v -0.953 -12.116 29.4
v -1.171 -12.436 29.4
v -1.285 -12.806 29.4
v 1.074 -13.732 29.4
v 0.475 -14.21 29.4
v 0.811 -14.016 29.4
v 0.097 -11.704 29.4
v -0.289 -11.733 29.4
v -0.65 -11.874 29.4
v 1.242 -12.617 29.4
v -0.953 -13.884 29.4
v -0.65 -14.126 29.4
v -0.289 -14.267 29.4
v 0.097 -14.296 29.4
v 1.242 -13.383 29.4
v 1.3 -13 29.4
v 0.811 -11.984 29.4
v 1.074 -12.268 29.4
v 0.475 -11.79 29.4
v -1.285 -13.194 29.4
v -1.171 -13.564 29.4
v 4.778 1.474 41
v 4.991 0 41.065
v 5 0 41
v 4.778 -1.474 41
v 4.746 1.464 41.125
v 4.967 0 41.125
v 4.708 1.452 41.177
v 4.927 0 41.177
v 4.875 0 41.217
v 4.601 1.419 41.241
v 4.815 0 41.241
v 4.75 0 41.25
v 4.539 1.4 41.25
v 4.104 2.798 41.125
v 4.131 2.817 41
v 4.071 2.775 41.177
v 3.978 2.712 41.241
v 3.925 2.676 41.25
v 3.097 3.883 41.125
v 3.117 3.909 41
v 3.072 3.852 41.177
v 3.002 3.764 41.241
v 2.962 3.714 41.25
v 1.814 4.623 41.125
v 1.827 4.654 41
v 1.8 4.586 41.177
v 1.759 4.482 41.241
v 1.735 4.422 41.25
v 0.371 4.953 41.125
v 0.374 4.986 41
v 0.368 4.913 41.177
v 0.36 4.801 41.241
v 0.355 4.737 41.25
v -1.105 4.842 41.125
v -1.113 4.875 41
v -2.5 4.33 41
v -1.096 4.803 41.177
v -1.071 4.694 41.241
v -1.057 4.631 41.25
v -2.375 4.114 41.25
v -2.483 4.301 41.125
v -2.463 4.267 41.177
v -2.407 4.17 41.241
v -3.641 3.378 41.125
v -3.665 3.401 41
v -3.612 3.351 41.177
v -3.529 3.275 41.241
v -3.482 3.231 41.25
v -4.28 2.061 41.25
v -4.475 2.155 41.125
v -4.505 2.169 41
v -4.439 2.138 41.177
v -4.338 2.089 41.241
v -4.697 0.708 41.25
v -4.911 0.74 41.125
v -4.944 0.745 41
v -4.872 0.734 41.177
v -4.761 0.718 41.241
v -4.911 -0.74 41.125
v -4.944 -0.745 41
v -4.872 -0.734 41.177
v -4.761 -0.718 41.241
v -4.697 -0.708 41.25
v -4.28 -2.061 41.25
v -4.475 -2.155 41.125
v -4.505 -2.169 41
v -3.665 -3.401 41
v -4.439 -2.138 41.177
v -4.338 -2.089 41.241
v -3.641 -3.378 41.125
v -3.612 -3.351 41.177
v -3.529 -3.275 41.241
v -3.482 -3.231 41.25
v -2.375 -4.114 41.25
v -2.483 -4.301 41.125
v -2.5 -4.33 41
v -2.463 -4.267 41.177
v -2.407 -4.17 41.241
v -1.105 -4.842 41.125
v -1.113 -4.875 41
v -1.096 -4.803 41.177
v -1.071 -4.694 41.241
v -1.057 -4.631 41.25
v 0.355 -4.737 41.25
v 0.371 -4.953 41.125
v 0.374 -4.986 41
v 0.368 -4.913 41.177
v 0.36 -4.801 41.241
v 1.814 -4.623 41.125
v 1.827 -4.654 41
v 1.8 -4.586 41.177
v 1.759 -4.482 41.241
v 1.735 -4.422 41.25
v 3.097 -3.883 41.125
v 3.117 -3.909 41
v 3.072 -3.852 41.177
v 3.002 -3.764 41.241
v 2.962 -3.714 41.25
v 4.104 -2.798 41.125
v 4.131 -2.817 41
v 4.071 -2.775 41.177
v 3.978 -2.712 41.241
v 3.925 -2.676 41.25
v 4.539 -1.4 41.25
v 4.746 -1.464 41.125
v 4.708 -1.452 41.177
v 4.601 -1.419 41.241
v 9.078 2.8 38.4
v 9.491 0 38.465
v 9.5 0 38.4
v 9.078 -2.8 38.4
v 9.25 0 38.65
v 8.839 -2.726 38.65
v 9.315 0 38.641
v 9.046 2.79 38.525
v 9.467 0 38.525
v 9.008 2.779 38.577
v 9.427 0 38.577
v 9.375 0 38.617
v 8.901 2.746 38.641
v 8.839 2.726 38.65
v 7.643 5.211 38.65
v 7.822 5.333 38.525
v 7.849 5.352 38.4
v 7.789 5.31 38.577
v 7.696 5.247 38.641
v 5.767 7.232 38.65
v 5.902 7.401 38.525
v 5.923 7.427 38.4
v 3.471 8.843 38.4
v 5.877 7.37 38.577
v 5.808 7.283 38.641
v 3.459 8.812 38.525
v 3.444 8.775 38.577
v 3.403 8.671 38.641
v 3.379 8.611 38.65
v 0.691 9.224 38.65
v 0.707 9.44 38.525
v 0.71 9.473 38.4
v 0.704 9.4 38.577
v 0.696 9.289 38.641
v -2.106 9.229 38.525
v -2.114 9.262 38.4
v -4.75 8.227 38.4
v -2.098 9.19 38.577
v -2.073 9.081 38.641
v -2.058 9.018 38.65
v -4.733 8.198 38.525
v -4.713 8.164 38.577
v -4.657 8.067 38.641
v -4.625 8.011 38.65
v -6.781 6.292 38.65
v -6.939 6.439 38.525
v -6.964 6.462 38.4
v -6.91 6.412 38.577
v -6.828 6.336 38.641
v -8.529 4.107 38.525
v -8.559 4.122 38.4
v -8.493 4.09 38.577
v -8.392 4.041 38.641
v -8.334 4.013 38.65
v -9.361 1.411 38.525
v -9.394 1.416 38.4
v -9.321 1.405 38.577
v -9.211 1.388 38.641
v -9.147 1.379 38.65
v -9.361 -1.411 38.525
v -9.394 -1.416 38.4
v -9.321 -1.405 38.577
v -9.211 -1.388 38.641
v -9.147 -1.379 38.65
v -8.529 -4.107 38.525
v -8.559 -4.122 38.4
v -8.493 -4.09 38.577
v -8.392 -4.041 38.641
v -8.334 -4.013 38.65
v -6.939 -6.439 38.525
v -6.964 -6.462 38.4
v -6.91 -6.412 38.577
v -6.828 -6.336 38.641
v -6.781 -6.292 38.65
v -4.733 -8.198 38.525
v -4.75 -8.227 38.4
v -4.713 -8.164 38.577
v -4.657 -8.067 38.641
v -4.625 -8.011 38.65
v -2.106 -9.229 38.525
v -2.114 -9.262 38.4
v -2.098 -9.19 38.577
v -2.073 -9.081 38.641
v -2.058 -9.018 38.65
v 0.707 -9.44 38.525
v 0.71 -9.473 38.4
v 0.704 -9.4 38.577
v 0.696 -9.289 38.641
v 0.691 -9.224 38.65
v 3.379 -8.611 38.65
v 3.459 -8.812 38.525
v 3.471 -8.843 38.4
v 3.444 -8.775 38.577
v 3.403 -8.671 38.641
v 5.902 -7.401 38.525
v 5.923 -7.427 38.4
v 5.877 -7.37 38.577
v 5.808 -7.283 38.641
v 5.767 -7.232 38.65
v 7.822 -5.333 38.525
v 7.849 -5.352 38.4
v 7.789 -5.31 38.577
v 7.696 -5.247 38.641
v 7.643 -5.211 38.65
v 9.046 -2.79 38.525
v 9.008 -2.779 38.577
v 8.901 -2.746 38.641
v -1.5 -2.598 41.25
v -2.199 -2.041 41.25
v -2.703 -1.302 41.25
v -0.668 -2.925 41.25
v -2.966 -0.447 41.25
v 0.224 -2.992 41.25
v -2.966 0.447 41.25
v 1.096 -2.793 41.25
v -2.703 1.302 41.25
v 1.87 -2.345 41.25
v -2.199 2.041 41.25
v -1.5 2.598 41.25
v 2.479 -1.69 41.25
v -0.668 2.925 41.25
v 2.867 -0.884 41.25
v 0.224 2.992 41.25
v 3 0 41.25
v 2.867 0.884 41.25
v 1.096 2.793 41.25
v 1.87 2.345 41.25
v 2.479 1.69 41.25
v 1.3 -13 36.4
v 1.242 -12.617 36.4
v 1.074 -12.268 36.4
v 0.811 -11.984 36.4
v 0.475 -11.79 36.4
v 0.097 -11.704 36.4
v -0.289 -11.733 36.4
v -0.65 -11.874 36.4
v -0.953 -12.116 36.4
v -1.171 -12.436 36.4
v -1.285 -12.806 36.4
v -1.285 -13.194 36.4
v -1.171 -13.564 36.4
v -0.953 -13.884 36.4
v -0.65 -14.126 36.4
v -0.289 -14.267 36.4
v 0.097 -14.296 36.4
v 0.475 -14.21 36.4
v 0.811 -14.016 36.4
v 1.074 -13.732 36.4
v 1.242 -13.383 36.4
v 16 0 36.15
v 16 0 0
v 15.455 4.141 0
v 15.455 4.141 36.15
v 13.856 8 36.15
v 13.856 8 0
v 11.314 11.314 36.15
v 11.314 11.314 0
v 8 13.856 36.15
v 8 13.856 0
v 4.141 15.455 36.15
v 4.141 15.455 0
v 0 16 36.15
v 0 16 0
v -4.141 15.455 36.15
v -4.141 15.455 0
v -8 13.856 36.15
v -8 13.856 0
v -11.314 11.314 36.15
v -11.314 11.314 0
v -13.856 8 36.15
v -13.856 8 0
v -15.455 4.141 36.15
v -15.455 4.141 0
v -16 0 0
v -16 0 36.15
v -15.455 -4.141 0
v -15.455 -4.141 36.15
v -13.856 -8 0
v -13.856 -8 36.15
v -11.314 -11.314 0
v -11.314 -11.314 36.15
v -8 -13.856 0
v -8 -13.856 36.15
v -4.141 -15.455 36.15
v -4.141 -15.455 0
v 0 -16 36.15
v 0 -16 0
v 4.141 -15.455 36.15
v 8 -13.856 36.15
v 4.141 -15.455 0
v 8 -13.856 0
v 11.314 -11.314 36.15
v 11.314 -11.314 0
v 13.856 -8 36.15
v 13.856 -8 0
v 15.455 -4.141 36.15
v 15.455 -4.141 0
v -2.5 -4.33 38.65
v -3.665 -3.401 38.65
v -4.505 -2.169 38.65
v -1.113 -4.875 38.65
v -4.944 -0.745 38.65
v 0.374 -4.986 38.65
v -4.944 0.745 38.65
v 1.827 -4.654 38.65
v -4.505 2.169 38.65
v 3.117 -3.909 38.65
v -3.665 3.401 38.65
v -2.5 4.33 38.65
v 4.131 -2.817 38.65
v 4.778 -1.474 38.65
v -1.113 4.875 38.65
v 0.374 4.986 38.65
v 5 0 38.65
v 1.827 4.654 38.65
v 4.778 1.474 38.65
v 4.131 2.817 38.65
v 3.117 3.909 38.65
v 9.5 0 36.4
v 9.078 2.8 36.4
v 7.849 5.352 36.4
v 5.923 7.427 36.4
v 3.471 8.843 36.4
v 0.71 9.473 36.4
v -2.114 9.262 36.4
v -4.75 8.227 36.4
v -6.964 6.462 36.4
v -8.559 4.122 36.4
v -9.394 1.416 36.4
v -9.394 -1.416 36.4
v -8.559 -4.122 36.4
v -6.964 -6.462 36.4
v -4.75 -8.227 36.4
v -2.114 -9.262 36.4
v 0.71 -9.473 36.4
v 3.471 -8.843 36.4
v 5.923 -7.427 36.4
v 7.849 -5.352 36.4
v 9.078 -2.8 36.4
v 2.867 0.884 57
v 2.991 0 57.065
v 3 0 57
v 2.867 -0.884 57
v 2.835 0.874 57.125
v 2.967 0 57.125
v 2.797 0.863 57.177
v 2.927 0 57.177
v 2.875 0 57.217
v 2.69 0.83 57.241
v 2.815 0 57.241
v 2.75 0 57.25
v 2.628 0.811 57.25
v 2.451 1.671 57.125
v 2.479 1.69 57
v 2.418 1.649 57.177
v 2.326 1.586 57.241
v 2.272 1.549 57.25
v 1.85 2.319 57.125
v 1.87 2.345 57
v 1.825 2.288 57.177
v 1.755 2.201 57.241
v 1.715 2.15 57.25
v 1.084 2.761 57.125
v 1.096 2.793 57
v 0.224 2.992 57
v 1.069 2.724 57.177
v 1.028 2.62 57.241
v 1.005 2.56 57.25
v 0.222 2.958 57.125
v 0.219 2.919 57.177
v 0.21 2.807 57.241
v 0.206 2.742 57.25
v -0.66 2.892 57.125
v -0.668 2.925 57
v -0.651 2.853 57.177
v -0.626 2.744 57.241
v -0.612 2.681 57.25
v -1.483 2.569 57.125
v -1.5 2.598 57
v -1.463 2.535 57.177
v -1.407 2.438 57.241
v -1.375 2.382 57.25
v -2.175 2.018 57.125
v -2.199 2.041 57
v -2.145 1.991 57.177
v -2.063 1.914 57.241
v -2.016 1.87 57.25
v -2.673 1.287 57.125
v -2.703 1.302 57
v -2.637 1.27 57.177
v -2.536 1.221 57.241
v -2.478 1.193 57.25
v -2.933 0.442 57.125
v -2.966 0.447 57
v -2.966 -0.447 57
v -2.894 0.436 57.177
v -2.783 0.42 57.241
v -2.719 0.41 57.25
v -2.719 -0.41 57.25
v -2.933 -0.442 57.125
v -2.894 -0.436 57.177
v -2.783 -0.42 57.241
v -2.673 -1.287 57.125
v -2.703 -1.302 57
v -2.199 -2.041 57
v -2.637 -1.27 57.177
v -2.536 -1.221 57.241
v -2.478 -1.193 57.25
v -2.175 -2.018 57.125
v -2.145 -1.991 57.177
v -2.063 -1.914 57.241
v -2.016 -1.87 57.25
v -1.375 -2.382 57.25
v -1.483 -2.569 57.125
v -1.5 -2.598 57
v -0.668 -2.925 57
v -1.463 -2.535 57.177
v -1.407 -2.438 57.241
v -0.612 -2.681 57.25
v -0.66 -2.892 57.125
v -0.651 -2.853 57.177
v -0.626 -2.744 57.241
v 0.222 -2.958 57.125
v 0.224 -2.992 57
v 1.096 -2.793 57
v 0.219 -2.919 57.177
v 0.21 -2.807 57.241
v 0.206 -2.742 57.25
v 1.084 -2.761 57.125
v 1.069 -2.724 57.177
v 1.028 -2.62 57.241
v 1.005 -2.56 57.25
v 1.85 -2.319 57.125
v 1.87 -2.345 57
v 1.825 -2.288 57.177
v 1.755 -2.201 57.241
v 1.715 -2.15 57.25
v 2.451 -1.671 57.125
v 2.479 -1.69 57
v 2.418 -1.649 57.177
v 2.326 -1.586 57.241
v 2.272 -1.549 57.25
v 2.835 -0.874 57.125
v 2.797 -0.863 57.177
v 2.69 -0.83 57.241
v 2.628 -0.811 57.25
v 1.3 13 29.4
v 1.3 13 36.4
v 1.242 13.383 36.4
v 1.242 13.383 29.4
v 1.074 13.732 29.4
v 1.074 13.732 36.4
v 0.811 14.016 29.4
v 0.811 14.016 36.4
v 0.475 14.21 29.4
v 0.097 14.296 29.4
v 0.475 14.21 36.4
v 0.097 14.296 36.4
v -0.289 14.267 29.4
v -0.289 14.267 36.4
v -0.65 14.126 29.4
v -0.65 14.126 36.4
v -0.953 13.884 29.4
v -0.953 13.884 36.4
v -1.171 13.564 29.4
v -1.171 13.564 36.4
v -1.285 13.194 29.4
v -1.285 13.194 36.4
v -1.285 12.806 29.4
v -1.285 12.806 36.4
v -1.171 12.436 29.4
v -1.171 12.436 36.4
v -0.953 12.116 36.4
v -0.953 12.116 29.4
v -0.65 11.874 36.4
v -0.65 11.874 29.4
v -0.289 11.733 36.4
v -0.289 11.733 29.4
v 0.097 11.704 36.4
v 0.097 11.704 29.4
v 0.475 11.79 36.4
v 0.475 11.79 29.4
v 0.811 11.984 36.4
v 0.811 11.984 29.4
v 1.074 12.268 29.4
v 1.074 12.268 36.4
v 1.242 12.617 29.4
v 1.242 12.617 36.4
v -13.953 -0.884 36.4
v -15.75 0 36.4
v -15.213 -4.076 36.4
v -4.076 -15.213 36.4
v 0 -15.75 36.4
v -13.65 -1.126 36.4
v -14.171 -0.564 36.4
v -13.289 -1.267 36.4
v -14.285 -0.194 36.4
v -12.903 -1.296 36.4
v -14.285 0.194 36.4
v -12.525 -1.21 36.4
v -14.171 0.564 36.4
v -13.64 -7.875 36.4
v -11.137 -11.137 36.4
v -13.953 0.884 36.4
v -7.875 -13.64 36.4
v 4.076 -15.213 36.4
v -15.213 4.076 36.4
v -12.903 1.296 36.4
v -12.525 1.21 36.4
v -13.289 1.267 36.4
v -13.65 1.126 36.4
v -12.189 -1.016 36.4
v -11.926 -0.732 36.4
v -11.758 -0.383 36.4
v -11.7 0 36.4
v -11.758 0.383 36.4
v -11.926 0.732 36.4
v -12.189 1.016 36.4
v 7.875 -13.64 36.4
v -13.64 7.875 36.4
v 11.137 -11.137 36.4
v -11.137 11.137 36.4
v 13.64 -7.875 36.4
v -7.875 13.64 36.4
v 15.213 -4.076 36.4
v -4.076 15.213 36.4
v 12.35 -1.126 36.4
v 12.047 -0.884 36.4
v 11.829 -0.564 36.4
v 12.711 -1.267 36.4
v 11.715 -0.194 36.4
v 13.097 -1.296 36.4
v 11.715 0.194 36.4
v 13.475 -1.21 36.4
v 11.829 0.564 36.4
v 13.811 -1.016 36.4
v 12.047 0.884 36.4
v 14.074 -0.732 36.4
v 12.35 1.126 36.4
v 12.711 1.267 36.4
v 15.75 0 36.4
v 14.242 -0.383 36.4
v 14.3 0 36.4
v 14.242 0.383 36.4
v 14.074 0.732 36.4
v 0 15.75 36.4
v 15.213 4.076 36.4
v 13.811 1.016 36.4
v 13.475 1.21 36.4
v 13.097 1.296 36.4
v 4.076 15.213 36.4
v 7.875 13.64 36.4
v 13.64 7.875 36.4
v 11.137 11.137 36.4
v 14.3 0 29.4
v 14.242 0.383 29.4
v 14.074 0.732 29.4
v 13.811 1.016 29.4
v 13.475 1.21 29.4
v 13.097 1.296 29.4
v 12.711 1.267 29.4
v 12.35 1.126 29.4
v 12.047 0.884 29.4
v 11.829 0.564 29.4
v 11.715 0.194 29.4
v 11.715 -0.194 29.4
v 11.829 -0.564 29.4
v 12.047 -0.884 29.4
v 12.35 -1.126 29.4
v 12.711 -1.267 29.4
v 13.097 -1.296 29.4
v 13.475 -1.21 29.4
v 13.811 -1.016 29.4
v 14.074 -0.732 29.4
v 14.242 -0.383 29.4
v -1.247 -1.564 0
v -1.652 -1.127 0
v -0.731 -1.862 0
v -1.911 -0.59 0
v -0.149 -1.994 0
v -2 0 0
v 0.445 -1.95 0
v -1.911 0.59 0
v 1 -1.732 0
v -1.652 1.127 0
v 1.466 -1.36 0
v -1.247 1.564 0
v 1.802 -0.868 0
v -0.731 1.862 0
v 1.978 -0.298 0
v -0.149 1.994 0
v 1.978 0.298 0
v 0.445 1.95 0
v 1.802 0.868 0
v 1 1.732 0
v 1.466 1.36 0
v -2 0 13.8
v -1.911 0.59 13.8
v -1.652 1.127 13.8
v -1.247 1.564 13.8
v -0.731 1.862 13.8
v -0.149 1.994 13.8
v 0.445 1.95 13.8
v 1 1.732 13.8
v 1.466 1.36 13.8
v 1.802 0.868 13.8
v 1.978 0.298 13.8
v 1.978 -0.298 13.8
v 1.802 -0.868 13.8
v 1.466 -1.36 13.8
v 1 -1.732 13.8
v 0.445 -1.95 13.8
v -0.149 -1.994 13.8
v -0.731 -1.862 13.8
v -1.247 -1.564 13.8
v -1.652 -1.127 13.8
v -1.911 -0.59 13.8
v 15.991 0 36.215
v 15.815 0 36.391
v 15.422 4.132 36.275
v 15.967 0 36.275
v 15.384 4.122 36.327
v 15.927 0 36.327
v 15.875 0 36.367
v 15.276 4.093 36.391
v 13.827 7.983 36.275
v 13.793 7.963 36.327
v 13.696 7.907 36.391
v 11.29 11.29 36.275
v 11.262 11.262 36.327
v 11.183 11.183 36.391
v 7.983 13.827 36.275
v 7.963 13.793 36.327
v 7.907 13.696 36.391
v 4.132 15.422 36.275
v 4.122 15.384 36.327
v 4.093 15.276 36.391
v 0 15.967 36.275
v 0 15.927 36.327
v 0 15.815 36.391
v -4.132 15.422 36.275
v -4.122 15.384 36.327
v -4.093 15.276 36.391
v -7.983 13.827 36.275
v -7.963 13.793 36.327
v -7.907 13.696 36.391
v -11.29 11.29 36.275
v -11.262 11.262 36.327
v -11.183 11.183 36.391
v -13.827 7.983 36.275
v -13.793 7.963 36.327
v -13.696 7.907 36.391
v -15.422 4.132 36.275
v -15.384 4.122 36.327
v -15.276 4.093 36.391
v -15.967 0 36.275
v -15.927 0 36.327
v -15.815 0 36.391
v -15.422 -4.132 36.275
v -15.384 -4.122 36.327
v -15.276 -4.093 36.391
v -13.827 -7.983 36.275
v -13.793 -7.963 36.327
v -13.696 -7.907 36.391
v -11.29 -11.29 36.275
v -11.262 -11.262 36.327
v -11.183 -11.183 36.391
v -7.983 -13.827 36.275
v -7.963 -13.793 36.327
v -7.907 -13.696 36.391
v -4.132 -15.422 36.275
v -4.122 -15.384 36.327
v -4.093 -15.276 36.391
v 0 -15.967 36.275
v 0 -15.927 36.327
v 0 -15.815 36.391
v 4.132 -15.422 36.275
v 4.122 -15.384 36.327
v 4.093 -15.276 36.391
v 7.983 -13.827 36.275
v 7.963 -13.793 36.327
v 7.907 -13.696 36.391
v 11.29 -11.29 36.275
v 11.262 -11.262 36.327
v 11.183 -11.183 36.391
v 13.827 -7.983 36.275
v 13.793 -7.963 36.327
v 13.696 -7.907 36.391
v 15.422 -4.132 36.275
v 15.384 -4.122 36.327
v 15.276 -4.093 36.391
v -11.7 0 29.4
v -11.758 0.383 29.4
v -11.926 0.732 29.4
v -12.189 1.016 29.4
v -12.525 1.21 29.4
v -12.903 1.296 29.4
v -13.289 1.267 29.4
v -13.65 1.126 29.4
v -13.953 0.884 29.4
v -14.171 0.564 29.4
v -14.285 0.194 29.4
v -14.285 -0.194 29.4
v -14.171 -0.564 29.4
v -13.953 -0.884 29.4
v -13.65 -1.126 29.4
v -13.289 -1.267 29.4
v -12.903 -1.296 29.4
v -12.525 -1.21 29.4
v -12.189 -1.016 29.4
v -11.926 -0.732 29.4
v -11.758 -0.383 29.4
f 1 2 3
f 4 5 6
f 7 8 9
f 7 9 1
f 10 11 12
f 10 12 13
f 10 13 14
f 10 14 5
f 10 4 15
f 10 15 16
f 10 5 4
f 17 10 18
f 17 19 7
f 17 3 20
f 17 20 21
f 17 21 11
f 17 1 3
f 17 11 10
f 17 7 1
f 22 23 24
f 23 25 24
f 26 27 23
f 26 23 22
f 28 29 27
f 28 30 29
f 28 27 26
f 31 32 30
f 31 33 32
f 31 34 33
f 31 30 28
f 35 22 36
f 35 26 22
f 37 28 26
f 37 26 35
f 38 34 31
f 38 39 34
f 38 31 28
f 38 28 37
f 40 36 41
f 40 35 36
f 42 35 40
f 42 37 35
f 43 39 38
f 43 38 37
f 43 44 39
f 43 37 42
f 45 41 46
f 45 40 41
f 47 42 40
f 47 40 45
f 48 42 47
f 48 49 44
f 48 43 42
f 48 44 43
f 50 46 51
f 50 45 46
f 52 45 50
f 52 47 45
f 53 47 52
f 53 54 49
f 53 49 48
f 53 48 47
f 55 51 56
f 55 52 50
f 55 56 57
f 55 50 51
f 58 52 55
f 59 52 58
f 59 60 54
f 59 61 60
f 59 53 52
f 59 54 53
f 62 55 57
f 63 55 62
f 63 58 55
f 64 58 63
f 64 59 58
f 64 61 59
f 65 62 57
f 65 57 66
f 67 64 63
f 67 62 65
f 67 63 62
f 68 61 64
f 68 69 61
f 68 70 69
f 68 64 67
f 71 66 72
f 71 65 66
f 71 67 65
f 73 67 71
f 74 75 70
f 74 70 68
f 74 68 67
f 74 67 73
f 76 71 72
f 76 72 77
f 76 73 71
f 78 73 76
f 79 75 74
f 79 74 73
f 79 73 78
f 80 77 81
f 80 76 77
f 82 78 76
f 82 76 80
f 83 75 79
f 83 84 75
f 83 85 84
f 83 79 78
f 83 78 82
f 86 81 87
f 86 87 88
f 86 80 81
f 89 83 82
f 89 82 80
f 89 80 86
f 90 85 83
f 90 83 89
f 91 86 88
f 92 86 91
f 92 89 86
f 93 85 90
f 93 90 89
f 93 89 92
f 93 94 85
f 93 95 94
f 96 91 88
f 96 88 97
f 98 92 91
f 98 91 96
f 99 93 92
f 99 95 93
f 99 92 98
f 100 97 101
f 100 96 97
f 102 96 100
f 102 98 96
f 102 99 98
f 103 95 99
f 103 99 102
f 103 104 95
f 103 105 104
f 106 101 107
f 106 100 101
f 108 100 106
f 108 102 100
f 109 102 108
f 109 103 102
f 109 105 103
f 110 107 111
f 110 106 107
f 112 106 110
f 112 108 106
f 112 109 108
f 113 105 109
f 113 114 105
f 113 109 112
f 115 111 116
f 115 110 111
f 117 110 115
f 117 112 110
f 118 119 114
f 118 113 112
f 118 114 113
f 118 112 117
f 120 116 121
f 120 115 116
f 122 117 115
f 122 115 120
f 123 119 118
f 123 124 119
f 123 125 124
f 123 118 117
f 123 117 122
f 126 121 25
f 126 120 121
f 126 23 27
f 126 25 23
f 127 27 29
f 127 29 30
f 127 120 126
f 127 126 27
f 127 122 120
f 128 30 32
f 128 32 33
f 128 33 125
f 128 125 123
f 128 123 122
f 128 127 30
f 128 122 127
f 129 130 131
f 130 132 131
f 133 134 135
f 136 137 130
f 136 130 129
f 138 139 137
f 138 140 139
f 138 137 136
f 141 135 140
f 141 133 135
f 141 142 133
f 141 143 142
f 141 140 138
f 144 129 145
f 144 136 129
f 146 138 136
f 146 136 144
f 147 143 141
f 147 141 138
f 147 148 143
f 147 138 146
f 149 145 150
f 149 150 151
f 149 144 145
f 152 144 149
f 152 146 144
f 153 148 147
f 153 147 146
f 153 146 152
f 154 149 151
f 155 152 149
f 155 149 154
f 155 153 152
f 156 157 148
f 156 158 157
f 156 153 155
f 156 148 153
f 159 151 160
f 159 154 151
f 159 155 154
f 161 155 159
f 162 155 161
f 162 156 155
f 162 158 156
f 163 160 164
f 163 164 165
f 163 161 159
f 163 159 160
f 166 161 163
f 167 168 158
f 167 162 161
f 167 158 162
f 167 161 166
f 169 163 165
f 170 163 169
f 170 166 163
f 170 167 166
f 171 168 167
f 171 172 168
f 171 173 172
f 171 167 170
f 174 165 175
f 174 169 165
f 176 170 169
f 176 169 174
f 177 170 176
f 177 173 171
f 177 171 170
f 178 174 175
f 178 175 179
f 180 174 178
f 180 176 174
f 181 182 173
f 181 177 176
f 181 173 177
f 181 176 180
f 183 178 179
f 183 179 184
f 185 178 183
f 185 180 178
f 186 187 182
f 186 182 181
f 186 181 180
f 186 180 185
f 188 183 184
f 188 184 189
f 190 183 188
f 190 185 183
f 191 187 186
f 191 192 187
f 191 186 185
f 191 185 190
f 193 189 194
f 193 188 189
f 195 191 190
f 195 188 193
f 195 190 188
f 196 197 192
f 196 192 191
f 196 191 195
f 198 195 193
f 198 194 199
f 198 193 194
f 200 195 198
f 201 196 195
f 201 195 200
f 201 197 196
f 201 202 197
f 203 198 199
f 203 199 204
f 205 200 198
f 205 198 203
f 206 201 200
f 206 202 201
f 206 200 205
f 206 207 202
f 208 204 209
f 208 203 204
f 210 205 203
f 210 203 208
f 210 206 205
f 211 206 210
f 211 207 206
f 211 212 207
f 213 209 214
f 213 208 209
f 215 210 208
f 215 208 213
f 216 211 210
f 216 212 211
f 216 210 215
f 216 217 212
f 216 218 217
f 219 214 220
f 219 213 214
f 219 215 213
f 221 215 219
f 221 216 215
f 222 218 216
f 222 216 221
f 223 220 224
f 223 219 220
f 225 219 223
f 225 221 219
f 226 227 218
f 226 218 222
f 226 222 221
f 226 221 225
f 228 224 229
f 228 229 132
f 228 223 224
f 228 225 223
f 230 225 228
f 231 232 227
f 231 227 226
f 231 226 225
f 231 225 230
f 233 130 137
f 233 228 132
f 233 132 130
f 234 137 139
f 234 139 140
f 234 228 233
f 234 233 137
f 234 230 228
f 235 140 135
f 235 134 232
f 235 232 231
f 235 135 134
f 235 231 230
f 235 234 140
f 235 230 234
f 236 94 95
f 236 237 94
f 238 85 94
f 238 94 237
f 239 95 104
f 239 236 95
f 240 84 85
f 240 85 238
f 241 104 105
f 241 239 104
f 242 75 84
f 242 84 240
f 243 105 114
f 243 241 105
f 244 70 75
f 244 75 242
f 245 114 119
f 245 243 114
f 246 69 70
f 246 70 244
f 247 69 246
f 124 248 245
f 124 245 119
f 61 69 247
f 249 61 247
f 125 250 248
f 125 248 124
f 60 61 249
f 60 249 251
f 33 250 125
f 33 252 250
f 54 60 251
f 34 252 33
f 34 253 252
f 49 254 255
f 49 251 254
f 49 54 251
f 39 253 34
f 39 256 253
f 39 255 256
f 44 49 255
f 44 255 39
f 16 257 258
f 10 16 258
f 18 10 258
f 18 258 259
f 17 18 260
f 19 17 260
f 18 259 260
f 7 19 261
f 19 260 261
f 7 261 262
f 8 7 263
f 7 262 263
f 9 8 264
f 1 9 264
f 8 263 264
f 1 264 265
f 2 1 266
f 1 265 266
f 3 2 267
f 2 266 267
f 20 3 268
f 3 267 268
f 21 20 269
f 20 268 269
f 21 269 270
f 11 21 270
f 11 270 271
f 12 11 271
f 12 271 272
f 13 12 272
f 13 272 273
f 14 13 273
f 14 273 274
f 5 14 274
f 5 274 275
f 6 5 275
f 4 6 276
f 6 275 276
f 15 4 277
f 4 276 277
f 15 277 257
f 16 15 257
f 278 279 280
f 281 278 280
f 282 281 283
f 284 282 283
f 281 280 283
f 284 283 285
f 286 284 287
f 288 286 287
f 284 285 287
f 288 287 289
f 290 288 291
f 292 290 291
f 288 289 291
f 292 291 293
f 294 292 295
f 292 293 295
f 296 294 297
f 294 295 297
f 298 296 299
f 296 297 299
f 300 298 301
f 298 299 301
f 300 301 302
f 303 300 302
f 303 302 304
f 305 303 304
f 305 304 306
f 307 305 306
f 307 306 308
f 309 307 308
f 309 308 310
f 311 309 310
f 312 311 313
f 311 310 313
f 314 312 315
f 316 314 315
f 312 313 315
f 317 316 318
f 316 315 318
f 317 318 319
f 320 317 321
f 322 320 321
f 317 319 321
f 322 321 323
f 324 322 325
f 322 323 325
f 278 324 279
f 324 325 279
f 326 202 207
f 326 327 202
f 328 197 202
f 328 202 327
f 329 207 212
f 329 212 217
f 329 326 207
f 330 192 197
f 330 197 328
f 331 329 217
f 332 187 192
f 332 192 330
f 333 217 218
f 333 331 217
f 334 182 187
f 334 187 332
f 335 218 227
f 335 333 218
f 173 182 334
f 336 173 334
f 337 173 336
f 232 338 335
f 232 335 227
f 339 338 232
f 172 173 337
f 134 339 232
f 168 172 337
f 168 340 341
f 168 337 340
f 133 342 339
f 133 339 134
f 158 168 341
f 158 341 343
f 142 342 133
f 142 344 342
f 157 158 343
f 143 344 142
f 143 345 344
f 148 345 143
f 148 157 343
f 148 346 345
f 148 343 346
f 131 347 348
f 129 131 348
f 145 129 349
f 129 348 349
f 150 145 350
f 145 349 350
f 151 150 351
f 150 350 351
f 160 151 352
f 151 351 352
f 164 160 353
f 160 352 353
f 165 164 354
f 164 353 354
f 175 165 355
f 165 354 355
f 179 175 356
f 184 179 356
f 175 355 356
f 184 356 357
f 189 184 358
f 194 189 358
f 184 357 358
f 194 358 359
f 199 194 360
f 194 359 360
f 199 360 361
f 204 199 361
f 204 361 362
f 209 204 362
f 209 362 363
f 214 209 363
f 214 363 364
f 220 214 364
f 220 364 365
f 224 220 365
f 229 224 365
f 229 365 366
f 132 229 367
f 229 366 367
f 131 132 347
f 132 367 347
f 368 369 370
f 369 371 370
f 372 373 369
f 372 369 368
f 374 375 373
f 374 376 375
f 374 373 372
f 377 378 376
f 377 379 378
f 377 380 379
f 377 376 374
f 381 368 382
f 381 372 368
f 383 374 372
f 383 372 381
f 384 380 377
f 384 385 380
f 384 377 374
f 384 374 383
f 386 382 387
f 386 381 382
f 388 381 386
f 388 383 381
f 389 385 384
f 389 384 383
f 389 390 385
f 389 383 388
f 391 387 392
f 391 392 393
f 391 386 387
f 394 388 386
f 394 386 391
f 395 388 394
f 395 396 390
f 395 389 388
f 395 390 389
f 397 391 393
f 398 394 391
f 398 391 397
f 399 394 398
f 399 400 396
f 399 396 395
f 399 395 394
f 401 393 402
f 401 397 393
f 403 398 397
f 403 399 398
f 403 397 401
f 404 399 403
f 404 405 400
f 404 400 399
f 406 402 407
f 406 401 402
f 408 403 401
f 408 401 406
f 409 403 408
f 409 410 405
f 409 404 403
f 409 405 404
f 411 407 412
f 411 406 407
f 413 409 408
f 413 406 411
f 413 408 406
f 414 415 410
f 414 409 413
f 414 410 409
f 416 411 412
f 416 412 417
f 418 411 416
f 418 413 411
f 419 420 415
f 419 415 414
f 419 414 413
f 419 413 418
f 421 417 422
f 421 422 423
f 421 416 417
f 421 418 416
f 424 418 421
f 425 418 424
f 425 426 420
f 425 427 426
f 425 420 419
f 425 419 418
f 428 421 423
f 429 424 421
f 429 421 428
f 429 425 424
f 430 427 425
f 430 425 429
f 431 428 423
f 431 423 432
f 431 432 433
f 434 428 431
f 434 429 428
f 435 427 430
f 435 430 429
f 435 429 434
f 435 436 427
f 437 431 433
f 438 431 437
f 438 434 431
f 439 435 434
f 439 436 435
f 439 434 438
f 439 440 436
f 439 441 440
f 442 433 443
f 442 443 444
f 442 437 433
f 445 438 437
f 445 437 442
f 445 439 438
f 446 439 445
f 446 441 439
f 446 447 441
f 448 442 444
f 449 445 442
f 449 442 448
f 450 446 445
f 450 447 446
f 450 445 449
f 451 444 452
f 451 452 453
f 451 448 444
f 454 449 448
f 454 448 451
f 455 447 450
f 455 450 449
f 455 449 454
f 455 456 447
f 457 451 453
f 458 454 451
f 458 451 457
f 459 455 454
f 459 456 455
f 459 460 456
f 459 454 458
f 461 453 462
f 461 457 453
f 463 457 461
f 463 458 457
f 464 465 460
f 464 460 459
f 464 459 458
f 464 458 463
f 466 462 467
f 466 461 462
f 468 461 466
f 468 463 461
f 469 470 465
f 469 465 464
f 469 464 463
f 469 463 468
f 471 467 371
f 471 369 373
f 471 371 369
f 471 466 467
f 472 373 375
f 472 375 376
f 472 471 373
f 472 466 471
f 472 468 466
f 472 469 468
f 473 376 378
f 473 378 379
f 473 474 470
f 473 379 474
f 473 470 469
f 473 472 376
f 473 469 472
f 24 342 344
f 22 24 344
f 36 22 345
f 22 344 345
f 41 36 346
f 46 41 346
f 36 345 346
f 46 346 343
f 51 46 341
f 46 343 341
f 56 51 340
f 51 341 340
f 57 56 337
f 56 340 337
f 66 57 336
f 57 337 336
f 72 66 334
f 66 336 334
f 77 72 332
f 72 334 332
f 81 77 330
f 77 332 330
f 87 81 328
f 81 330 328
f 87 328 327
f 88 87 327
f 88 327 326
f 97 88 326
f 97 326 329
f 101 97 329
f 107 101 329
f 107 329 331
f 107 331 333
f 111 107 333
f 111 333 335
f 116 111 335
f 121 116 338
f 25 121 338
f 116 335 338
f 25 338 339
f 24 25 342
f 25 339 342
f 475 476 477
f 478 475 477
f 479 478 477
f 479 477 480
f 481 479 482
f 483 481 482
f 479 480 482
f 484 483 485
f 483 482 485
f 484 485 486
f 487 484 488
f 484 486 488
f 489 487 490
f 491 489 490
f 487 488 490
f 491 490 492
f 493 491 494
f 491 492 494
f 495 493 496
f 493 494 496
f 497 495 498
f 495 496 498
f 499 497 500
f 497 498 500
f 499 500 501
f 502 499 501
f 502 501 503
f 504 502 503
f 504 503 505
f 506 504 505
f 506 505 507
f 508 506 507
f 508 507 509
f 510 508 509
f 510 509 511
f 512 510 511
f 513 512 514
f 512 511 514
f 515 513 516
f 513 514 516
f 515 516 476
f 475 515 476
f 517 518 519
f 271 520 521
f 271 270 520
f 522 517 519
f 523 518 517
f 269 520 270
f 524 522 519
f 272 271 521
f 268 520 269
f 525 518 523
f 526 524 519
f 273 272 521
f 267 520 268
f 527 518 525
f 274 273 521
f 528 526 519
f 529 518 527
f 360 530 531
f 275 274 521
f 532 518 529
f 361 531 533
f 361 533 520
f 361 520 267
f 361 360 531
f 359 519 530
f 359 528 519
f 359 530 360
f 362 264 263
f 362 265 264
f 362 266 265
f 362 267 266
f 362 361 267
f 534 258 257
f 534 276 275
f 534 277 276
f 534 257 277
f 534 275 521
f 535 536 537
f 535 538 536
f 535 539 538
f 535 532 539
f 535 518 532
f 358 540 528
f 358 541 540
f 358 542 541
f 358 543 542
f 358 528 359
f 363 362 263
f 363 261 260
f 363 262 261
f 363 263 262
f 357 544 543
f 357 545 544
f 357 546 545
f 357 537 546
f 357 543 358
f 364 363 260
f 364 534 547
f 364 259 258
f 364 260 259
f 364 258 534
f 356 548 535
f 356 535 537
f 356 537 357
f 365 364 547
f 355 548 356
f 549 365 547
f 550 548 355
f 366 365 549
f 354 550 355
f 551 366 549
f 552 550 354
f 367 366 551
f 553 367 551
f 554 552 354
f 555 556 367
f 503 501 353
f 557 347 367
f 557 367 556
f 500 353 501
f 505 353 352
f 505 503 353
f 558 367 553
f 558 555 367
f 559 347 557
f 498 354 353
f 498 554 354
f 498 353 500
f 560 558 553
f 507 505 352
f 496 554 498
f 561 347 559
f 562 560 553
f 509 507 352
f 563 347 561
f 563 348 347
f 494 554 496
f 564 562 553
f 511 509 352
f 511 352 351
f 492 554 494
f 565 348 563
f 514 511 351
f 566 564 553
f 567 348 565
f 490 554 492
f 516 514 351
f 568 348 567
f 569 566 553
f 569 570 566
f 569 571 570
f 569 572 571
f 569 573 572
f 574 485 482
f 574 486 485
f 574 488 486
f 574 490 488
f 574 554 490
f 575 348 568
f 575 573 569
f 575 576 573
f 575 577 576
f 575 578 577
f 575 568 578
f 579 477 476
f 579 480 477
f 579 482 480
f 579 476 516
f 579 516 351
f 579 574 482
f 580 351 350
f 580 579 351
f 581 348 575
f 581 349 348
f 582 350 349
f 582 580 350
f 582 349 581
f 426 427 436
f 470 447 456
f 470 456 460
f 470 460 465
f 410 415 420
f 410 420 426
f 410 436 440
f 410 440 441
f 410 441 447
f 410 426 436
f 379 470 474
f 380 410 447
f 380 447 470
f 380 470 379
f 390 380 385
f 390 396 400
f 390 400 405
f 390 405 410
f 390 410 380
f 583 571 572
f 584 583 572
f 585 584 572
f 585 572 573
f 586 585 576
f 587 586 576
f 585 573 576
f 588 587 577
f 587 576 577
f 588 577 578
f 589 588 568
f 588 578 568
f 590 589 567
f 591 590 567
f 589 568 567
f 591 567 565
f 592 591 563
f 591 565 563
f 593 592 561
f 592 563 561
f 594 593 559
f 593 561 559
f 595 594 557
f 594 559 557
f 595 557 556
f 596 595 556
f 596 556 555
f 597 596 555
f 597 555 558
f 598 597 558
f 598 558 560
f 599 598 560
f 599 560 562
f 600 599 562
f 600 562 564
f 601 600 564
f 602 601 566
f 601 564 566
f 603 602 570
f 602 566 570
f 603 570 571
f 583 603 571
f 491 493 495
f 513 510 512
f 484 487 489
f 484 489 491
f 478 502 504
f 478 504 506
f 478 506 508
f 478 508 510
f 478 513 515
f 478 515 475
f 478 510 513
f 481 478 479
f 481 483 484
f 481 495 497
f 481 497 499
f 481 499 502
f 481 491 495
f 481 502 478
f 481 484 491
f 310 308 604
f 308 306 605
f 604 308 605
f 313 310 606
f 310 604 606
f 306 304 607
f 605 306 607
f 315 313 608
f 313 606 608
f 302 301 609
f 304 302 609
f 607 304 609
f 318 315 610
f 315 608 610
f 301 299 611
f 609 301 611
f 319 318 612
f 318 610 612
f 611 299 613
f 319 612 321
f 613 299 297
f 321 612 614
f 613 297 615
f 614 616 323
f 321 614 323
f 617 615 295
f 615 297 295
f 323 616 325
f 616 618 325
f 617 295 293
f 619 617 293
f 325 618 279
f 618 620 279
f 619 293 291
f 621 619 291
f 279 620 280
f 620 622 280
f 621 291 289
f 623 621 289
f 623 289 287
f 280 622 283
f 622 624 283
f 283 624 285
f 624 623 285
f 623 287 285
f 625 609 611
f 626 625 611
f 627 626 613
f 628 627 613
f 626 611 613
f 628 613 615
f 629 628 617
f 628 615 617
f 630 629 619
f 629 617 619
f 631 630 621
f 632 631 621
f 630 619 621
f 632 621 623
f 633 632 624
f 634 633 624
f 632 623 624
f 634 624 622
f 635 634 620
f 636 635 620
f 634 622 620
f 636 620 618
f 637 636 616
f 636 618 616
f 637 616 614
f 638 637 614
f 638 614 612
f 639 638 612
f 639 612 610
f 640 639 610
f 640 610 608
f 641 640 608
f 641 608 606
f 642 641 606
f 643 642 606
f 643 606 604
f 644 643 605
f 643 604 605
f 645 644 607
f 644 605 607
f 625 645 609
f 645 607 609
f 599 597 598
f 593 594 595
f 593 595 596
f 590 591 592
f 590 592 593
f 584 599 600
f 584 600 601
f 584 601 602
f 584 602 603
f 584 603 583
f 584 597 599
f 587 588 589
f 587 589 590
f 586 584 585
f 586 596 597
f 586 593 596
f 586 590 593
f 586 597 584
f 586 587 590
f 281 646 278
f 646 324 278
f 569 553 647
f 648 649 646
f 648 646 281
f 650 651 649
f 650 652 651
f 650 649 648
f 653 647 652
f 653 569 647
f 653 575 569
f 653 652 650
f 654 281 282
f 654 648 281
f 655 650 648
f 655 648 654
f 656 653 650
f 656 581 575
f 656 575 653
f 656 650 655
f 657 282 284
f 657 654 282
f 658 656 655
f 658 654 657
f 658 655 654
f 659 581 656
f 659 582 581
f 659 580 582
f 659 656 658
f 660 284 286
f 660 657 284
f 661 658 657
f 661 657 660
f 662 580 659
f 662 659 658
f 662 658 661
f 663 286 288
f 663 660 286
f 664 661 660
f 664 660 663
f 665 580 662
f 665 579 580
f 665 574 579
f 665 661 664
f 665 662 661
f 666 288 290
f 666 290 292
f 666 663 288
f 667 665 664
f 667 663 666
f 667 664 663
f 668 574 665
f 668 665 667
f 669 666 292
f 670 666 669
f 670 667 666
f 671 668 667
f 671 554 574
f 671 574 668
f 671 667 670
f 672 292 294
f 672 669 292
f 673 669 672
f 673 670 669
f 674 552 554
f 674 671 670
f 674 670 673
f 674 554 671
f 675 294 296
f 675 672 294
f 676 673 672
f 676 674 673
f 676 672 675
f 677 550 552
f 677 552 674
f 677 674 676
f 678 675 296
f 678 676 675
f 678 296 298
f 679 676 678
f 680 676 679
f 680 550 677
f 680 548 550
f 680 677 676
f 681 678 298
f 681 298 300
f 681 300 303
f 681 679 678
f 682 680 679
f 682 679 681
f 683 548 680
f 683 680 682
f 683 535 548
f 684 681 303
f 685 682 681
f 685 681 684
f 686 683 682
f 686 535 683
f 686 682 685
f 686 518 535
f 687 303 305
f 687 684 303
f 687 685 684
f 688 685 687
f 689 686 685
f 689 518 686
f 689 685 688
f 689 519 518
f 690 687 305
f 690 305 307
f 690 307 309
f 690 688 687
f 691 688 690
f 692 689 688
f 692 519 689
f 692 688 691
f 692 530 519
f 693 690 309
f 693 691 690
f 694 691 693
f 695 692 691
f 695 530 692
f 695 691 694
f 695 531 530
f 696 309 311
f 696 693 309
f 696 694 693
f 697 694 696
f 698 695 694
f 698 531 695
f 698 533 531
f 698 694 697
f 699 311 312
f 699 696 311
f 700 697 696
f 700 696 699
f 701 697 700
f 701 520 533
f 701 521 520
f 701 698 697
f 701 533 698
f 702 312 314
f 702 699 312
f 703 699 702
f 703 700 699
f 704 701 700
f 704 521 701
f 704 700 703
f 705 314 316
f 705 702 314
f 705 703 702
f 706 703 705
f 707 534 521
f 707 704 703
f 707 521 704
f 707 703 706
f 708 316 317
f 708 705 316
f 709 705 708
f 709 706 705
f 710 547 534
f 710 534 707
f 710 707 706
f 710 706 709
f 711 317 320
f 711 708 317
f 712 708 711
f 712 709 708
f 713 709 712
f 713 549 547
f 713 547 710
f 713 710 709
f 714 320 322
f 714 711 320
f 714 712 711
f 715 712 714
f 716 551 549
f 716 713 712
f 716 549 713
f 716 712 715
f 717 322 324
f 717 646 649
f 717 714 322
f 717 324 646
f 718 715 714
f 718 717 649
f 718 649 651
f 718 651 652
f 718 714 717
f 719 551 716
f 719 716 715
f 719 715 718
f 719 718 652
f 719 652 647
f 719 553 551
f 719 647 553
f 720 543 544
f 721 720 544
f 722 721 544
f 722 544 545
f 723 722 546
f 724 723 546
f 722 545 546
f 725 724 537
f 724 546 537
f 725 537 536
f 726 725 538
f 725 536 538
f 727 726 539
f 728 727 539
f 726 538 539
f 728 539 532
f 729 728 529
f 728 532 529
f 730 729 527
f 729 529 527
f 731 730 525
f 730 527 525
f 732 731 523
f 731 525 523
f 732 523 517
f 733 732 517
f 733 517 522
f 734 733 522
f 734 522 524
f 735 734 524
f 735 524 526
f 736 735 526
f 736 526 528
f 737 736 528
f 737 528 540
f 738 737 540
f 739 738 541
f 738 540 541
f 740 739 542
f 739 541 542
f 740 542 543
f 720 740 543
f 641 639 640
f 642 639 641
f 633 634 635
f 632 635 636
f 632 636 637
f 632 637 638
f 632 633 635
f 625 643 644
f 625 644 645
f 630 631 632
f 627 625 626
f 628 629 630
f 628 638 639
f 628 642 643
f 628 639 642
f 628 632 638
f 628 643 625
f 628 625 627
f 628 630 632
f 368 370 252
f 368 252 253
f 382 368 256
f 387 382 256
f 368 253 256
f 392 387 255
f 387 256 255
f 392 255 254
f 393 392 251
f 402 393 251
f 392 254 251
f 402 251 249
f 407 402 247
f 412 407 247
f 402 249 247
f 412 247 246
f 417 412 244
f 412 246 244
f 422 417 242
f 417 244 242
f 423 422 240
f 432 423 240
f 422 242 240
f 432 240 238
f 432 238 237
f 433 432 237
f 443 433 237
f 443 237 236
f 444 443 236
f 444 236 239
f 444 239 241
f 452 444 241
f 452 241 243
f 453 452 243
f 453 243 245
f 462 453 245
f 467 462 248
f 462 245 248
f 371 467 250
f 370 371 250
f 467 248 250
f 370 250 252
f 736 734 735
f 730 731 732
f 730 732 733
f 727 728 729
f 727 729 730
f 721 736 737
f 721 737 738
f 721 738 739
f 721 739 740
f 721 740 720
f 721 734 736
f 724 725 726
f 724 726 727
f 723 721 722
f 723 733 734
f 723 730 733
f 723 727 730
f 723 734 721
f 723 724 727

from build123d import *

# Parameters (mm, degrees)
ESQUISSE1_R             = 16
BOSS_EXTRU_1_DEPTH      = 36.4
ESQUISSE2_R             = 9.5
BOSS_EXTRU_2_DEPTH      = 2.25
ESQUISSE3_R             = 5
BOSS_EXTRU_3_DEPTH      = 2.6
ESQUISSE4_R             = 3
BOSS_EXTRU_4_DEPTH      = 16
CONG_1_R                = 0.25
ESQUISSE6_R             = 1.3
ENL_V_MAT_EXTRU_1_DEPTH = 7
ESQUISSE7_R             = 2
ENL_V_MAT_EXTRU_2_DEPTH = 13.8


with BuildPart() as part:
    # Esquisse1 → Boss.-Extru.1 (new body)
    with BuildSketch(Plane.XY):
        Circle(ESQUISSE1_R)
    extrude(amount=BOSS_EXTRU_1_DEPTH)

    # Esquisse2 → Boss.-Extru.2 (add)
    with BuildSketch(Plane.XY.offset(36.4)):
        Circle(ESQUISSE2_R)
    extrude(amount=BOSS_EXTRU_2_DEPTH)

    # Esquisse3 → Boss.-Extru.3 (add)
    with BuildSketch(Plane.XY.offset(38.65)):
        Circle(ESQUISSE3_R)
    extrude(amount=BOSS_EXTRU_3_DEPTH)

    # Esquisse4 → Boss.-Extru.4 (add)
    with BuildSketch(Plane.XY.offset(41.25)):
        Circle(ESQUISSE4_R)
    extrude(amount=BOSS_EXTRU_4_DEPTH)

    # Congé1
    cong_1_edges = [part.edges().sort_by_distance(p)[0] for p in [
        (-5, 0, 41.25),
        (-3, 0, 57.25),
        (-16, 0, 36.4),
        (-9.5, 0, 38.65),
    ]]
    fillet(cong_1_edges, radius=CONG_1_R)

    # Esquisse6 → Enlèv. mat.-Extru.1 (cut)
    with BuildSketch(Plane.XY.offset(36.4)):
        with Locations((0, 13)):
            Circle(ESQUISSE6_R)
        with Locations((-13, 0)):
            Circle(ESQUISSE6_R)
        with Locations((13, 0)):
            Circle(ESQUISSE6_R)
        with Locations((0, -13)):
            Circle(ESQUISSE6_R)
    extrude(amount=-ENL_V_MAT_EXTRU_1_DEPTH, mode=Mode.SUBTRACT)

    # Esquisse7 → Enlèv. mat.-Extru.2 (cut)
    with BuildSketch(Plane(origin=(0, 0, 0), x_dir=(-1, 0, 0), z_dir=(0, 0, -1))):
        Circle(ESQUISSE7_R)
    extrude(amount=-ENL_V_MAT_EXTRU_2_DEPTH, mode=Mode.SUBTRACT)


solid = part.part
